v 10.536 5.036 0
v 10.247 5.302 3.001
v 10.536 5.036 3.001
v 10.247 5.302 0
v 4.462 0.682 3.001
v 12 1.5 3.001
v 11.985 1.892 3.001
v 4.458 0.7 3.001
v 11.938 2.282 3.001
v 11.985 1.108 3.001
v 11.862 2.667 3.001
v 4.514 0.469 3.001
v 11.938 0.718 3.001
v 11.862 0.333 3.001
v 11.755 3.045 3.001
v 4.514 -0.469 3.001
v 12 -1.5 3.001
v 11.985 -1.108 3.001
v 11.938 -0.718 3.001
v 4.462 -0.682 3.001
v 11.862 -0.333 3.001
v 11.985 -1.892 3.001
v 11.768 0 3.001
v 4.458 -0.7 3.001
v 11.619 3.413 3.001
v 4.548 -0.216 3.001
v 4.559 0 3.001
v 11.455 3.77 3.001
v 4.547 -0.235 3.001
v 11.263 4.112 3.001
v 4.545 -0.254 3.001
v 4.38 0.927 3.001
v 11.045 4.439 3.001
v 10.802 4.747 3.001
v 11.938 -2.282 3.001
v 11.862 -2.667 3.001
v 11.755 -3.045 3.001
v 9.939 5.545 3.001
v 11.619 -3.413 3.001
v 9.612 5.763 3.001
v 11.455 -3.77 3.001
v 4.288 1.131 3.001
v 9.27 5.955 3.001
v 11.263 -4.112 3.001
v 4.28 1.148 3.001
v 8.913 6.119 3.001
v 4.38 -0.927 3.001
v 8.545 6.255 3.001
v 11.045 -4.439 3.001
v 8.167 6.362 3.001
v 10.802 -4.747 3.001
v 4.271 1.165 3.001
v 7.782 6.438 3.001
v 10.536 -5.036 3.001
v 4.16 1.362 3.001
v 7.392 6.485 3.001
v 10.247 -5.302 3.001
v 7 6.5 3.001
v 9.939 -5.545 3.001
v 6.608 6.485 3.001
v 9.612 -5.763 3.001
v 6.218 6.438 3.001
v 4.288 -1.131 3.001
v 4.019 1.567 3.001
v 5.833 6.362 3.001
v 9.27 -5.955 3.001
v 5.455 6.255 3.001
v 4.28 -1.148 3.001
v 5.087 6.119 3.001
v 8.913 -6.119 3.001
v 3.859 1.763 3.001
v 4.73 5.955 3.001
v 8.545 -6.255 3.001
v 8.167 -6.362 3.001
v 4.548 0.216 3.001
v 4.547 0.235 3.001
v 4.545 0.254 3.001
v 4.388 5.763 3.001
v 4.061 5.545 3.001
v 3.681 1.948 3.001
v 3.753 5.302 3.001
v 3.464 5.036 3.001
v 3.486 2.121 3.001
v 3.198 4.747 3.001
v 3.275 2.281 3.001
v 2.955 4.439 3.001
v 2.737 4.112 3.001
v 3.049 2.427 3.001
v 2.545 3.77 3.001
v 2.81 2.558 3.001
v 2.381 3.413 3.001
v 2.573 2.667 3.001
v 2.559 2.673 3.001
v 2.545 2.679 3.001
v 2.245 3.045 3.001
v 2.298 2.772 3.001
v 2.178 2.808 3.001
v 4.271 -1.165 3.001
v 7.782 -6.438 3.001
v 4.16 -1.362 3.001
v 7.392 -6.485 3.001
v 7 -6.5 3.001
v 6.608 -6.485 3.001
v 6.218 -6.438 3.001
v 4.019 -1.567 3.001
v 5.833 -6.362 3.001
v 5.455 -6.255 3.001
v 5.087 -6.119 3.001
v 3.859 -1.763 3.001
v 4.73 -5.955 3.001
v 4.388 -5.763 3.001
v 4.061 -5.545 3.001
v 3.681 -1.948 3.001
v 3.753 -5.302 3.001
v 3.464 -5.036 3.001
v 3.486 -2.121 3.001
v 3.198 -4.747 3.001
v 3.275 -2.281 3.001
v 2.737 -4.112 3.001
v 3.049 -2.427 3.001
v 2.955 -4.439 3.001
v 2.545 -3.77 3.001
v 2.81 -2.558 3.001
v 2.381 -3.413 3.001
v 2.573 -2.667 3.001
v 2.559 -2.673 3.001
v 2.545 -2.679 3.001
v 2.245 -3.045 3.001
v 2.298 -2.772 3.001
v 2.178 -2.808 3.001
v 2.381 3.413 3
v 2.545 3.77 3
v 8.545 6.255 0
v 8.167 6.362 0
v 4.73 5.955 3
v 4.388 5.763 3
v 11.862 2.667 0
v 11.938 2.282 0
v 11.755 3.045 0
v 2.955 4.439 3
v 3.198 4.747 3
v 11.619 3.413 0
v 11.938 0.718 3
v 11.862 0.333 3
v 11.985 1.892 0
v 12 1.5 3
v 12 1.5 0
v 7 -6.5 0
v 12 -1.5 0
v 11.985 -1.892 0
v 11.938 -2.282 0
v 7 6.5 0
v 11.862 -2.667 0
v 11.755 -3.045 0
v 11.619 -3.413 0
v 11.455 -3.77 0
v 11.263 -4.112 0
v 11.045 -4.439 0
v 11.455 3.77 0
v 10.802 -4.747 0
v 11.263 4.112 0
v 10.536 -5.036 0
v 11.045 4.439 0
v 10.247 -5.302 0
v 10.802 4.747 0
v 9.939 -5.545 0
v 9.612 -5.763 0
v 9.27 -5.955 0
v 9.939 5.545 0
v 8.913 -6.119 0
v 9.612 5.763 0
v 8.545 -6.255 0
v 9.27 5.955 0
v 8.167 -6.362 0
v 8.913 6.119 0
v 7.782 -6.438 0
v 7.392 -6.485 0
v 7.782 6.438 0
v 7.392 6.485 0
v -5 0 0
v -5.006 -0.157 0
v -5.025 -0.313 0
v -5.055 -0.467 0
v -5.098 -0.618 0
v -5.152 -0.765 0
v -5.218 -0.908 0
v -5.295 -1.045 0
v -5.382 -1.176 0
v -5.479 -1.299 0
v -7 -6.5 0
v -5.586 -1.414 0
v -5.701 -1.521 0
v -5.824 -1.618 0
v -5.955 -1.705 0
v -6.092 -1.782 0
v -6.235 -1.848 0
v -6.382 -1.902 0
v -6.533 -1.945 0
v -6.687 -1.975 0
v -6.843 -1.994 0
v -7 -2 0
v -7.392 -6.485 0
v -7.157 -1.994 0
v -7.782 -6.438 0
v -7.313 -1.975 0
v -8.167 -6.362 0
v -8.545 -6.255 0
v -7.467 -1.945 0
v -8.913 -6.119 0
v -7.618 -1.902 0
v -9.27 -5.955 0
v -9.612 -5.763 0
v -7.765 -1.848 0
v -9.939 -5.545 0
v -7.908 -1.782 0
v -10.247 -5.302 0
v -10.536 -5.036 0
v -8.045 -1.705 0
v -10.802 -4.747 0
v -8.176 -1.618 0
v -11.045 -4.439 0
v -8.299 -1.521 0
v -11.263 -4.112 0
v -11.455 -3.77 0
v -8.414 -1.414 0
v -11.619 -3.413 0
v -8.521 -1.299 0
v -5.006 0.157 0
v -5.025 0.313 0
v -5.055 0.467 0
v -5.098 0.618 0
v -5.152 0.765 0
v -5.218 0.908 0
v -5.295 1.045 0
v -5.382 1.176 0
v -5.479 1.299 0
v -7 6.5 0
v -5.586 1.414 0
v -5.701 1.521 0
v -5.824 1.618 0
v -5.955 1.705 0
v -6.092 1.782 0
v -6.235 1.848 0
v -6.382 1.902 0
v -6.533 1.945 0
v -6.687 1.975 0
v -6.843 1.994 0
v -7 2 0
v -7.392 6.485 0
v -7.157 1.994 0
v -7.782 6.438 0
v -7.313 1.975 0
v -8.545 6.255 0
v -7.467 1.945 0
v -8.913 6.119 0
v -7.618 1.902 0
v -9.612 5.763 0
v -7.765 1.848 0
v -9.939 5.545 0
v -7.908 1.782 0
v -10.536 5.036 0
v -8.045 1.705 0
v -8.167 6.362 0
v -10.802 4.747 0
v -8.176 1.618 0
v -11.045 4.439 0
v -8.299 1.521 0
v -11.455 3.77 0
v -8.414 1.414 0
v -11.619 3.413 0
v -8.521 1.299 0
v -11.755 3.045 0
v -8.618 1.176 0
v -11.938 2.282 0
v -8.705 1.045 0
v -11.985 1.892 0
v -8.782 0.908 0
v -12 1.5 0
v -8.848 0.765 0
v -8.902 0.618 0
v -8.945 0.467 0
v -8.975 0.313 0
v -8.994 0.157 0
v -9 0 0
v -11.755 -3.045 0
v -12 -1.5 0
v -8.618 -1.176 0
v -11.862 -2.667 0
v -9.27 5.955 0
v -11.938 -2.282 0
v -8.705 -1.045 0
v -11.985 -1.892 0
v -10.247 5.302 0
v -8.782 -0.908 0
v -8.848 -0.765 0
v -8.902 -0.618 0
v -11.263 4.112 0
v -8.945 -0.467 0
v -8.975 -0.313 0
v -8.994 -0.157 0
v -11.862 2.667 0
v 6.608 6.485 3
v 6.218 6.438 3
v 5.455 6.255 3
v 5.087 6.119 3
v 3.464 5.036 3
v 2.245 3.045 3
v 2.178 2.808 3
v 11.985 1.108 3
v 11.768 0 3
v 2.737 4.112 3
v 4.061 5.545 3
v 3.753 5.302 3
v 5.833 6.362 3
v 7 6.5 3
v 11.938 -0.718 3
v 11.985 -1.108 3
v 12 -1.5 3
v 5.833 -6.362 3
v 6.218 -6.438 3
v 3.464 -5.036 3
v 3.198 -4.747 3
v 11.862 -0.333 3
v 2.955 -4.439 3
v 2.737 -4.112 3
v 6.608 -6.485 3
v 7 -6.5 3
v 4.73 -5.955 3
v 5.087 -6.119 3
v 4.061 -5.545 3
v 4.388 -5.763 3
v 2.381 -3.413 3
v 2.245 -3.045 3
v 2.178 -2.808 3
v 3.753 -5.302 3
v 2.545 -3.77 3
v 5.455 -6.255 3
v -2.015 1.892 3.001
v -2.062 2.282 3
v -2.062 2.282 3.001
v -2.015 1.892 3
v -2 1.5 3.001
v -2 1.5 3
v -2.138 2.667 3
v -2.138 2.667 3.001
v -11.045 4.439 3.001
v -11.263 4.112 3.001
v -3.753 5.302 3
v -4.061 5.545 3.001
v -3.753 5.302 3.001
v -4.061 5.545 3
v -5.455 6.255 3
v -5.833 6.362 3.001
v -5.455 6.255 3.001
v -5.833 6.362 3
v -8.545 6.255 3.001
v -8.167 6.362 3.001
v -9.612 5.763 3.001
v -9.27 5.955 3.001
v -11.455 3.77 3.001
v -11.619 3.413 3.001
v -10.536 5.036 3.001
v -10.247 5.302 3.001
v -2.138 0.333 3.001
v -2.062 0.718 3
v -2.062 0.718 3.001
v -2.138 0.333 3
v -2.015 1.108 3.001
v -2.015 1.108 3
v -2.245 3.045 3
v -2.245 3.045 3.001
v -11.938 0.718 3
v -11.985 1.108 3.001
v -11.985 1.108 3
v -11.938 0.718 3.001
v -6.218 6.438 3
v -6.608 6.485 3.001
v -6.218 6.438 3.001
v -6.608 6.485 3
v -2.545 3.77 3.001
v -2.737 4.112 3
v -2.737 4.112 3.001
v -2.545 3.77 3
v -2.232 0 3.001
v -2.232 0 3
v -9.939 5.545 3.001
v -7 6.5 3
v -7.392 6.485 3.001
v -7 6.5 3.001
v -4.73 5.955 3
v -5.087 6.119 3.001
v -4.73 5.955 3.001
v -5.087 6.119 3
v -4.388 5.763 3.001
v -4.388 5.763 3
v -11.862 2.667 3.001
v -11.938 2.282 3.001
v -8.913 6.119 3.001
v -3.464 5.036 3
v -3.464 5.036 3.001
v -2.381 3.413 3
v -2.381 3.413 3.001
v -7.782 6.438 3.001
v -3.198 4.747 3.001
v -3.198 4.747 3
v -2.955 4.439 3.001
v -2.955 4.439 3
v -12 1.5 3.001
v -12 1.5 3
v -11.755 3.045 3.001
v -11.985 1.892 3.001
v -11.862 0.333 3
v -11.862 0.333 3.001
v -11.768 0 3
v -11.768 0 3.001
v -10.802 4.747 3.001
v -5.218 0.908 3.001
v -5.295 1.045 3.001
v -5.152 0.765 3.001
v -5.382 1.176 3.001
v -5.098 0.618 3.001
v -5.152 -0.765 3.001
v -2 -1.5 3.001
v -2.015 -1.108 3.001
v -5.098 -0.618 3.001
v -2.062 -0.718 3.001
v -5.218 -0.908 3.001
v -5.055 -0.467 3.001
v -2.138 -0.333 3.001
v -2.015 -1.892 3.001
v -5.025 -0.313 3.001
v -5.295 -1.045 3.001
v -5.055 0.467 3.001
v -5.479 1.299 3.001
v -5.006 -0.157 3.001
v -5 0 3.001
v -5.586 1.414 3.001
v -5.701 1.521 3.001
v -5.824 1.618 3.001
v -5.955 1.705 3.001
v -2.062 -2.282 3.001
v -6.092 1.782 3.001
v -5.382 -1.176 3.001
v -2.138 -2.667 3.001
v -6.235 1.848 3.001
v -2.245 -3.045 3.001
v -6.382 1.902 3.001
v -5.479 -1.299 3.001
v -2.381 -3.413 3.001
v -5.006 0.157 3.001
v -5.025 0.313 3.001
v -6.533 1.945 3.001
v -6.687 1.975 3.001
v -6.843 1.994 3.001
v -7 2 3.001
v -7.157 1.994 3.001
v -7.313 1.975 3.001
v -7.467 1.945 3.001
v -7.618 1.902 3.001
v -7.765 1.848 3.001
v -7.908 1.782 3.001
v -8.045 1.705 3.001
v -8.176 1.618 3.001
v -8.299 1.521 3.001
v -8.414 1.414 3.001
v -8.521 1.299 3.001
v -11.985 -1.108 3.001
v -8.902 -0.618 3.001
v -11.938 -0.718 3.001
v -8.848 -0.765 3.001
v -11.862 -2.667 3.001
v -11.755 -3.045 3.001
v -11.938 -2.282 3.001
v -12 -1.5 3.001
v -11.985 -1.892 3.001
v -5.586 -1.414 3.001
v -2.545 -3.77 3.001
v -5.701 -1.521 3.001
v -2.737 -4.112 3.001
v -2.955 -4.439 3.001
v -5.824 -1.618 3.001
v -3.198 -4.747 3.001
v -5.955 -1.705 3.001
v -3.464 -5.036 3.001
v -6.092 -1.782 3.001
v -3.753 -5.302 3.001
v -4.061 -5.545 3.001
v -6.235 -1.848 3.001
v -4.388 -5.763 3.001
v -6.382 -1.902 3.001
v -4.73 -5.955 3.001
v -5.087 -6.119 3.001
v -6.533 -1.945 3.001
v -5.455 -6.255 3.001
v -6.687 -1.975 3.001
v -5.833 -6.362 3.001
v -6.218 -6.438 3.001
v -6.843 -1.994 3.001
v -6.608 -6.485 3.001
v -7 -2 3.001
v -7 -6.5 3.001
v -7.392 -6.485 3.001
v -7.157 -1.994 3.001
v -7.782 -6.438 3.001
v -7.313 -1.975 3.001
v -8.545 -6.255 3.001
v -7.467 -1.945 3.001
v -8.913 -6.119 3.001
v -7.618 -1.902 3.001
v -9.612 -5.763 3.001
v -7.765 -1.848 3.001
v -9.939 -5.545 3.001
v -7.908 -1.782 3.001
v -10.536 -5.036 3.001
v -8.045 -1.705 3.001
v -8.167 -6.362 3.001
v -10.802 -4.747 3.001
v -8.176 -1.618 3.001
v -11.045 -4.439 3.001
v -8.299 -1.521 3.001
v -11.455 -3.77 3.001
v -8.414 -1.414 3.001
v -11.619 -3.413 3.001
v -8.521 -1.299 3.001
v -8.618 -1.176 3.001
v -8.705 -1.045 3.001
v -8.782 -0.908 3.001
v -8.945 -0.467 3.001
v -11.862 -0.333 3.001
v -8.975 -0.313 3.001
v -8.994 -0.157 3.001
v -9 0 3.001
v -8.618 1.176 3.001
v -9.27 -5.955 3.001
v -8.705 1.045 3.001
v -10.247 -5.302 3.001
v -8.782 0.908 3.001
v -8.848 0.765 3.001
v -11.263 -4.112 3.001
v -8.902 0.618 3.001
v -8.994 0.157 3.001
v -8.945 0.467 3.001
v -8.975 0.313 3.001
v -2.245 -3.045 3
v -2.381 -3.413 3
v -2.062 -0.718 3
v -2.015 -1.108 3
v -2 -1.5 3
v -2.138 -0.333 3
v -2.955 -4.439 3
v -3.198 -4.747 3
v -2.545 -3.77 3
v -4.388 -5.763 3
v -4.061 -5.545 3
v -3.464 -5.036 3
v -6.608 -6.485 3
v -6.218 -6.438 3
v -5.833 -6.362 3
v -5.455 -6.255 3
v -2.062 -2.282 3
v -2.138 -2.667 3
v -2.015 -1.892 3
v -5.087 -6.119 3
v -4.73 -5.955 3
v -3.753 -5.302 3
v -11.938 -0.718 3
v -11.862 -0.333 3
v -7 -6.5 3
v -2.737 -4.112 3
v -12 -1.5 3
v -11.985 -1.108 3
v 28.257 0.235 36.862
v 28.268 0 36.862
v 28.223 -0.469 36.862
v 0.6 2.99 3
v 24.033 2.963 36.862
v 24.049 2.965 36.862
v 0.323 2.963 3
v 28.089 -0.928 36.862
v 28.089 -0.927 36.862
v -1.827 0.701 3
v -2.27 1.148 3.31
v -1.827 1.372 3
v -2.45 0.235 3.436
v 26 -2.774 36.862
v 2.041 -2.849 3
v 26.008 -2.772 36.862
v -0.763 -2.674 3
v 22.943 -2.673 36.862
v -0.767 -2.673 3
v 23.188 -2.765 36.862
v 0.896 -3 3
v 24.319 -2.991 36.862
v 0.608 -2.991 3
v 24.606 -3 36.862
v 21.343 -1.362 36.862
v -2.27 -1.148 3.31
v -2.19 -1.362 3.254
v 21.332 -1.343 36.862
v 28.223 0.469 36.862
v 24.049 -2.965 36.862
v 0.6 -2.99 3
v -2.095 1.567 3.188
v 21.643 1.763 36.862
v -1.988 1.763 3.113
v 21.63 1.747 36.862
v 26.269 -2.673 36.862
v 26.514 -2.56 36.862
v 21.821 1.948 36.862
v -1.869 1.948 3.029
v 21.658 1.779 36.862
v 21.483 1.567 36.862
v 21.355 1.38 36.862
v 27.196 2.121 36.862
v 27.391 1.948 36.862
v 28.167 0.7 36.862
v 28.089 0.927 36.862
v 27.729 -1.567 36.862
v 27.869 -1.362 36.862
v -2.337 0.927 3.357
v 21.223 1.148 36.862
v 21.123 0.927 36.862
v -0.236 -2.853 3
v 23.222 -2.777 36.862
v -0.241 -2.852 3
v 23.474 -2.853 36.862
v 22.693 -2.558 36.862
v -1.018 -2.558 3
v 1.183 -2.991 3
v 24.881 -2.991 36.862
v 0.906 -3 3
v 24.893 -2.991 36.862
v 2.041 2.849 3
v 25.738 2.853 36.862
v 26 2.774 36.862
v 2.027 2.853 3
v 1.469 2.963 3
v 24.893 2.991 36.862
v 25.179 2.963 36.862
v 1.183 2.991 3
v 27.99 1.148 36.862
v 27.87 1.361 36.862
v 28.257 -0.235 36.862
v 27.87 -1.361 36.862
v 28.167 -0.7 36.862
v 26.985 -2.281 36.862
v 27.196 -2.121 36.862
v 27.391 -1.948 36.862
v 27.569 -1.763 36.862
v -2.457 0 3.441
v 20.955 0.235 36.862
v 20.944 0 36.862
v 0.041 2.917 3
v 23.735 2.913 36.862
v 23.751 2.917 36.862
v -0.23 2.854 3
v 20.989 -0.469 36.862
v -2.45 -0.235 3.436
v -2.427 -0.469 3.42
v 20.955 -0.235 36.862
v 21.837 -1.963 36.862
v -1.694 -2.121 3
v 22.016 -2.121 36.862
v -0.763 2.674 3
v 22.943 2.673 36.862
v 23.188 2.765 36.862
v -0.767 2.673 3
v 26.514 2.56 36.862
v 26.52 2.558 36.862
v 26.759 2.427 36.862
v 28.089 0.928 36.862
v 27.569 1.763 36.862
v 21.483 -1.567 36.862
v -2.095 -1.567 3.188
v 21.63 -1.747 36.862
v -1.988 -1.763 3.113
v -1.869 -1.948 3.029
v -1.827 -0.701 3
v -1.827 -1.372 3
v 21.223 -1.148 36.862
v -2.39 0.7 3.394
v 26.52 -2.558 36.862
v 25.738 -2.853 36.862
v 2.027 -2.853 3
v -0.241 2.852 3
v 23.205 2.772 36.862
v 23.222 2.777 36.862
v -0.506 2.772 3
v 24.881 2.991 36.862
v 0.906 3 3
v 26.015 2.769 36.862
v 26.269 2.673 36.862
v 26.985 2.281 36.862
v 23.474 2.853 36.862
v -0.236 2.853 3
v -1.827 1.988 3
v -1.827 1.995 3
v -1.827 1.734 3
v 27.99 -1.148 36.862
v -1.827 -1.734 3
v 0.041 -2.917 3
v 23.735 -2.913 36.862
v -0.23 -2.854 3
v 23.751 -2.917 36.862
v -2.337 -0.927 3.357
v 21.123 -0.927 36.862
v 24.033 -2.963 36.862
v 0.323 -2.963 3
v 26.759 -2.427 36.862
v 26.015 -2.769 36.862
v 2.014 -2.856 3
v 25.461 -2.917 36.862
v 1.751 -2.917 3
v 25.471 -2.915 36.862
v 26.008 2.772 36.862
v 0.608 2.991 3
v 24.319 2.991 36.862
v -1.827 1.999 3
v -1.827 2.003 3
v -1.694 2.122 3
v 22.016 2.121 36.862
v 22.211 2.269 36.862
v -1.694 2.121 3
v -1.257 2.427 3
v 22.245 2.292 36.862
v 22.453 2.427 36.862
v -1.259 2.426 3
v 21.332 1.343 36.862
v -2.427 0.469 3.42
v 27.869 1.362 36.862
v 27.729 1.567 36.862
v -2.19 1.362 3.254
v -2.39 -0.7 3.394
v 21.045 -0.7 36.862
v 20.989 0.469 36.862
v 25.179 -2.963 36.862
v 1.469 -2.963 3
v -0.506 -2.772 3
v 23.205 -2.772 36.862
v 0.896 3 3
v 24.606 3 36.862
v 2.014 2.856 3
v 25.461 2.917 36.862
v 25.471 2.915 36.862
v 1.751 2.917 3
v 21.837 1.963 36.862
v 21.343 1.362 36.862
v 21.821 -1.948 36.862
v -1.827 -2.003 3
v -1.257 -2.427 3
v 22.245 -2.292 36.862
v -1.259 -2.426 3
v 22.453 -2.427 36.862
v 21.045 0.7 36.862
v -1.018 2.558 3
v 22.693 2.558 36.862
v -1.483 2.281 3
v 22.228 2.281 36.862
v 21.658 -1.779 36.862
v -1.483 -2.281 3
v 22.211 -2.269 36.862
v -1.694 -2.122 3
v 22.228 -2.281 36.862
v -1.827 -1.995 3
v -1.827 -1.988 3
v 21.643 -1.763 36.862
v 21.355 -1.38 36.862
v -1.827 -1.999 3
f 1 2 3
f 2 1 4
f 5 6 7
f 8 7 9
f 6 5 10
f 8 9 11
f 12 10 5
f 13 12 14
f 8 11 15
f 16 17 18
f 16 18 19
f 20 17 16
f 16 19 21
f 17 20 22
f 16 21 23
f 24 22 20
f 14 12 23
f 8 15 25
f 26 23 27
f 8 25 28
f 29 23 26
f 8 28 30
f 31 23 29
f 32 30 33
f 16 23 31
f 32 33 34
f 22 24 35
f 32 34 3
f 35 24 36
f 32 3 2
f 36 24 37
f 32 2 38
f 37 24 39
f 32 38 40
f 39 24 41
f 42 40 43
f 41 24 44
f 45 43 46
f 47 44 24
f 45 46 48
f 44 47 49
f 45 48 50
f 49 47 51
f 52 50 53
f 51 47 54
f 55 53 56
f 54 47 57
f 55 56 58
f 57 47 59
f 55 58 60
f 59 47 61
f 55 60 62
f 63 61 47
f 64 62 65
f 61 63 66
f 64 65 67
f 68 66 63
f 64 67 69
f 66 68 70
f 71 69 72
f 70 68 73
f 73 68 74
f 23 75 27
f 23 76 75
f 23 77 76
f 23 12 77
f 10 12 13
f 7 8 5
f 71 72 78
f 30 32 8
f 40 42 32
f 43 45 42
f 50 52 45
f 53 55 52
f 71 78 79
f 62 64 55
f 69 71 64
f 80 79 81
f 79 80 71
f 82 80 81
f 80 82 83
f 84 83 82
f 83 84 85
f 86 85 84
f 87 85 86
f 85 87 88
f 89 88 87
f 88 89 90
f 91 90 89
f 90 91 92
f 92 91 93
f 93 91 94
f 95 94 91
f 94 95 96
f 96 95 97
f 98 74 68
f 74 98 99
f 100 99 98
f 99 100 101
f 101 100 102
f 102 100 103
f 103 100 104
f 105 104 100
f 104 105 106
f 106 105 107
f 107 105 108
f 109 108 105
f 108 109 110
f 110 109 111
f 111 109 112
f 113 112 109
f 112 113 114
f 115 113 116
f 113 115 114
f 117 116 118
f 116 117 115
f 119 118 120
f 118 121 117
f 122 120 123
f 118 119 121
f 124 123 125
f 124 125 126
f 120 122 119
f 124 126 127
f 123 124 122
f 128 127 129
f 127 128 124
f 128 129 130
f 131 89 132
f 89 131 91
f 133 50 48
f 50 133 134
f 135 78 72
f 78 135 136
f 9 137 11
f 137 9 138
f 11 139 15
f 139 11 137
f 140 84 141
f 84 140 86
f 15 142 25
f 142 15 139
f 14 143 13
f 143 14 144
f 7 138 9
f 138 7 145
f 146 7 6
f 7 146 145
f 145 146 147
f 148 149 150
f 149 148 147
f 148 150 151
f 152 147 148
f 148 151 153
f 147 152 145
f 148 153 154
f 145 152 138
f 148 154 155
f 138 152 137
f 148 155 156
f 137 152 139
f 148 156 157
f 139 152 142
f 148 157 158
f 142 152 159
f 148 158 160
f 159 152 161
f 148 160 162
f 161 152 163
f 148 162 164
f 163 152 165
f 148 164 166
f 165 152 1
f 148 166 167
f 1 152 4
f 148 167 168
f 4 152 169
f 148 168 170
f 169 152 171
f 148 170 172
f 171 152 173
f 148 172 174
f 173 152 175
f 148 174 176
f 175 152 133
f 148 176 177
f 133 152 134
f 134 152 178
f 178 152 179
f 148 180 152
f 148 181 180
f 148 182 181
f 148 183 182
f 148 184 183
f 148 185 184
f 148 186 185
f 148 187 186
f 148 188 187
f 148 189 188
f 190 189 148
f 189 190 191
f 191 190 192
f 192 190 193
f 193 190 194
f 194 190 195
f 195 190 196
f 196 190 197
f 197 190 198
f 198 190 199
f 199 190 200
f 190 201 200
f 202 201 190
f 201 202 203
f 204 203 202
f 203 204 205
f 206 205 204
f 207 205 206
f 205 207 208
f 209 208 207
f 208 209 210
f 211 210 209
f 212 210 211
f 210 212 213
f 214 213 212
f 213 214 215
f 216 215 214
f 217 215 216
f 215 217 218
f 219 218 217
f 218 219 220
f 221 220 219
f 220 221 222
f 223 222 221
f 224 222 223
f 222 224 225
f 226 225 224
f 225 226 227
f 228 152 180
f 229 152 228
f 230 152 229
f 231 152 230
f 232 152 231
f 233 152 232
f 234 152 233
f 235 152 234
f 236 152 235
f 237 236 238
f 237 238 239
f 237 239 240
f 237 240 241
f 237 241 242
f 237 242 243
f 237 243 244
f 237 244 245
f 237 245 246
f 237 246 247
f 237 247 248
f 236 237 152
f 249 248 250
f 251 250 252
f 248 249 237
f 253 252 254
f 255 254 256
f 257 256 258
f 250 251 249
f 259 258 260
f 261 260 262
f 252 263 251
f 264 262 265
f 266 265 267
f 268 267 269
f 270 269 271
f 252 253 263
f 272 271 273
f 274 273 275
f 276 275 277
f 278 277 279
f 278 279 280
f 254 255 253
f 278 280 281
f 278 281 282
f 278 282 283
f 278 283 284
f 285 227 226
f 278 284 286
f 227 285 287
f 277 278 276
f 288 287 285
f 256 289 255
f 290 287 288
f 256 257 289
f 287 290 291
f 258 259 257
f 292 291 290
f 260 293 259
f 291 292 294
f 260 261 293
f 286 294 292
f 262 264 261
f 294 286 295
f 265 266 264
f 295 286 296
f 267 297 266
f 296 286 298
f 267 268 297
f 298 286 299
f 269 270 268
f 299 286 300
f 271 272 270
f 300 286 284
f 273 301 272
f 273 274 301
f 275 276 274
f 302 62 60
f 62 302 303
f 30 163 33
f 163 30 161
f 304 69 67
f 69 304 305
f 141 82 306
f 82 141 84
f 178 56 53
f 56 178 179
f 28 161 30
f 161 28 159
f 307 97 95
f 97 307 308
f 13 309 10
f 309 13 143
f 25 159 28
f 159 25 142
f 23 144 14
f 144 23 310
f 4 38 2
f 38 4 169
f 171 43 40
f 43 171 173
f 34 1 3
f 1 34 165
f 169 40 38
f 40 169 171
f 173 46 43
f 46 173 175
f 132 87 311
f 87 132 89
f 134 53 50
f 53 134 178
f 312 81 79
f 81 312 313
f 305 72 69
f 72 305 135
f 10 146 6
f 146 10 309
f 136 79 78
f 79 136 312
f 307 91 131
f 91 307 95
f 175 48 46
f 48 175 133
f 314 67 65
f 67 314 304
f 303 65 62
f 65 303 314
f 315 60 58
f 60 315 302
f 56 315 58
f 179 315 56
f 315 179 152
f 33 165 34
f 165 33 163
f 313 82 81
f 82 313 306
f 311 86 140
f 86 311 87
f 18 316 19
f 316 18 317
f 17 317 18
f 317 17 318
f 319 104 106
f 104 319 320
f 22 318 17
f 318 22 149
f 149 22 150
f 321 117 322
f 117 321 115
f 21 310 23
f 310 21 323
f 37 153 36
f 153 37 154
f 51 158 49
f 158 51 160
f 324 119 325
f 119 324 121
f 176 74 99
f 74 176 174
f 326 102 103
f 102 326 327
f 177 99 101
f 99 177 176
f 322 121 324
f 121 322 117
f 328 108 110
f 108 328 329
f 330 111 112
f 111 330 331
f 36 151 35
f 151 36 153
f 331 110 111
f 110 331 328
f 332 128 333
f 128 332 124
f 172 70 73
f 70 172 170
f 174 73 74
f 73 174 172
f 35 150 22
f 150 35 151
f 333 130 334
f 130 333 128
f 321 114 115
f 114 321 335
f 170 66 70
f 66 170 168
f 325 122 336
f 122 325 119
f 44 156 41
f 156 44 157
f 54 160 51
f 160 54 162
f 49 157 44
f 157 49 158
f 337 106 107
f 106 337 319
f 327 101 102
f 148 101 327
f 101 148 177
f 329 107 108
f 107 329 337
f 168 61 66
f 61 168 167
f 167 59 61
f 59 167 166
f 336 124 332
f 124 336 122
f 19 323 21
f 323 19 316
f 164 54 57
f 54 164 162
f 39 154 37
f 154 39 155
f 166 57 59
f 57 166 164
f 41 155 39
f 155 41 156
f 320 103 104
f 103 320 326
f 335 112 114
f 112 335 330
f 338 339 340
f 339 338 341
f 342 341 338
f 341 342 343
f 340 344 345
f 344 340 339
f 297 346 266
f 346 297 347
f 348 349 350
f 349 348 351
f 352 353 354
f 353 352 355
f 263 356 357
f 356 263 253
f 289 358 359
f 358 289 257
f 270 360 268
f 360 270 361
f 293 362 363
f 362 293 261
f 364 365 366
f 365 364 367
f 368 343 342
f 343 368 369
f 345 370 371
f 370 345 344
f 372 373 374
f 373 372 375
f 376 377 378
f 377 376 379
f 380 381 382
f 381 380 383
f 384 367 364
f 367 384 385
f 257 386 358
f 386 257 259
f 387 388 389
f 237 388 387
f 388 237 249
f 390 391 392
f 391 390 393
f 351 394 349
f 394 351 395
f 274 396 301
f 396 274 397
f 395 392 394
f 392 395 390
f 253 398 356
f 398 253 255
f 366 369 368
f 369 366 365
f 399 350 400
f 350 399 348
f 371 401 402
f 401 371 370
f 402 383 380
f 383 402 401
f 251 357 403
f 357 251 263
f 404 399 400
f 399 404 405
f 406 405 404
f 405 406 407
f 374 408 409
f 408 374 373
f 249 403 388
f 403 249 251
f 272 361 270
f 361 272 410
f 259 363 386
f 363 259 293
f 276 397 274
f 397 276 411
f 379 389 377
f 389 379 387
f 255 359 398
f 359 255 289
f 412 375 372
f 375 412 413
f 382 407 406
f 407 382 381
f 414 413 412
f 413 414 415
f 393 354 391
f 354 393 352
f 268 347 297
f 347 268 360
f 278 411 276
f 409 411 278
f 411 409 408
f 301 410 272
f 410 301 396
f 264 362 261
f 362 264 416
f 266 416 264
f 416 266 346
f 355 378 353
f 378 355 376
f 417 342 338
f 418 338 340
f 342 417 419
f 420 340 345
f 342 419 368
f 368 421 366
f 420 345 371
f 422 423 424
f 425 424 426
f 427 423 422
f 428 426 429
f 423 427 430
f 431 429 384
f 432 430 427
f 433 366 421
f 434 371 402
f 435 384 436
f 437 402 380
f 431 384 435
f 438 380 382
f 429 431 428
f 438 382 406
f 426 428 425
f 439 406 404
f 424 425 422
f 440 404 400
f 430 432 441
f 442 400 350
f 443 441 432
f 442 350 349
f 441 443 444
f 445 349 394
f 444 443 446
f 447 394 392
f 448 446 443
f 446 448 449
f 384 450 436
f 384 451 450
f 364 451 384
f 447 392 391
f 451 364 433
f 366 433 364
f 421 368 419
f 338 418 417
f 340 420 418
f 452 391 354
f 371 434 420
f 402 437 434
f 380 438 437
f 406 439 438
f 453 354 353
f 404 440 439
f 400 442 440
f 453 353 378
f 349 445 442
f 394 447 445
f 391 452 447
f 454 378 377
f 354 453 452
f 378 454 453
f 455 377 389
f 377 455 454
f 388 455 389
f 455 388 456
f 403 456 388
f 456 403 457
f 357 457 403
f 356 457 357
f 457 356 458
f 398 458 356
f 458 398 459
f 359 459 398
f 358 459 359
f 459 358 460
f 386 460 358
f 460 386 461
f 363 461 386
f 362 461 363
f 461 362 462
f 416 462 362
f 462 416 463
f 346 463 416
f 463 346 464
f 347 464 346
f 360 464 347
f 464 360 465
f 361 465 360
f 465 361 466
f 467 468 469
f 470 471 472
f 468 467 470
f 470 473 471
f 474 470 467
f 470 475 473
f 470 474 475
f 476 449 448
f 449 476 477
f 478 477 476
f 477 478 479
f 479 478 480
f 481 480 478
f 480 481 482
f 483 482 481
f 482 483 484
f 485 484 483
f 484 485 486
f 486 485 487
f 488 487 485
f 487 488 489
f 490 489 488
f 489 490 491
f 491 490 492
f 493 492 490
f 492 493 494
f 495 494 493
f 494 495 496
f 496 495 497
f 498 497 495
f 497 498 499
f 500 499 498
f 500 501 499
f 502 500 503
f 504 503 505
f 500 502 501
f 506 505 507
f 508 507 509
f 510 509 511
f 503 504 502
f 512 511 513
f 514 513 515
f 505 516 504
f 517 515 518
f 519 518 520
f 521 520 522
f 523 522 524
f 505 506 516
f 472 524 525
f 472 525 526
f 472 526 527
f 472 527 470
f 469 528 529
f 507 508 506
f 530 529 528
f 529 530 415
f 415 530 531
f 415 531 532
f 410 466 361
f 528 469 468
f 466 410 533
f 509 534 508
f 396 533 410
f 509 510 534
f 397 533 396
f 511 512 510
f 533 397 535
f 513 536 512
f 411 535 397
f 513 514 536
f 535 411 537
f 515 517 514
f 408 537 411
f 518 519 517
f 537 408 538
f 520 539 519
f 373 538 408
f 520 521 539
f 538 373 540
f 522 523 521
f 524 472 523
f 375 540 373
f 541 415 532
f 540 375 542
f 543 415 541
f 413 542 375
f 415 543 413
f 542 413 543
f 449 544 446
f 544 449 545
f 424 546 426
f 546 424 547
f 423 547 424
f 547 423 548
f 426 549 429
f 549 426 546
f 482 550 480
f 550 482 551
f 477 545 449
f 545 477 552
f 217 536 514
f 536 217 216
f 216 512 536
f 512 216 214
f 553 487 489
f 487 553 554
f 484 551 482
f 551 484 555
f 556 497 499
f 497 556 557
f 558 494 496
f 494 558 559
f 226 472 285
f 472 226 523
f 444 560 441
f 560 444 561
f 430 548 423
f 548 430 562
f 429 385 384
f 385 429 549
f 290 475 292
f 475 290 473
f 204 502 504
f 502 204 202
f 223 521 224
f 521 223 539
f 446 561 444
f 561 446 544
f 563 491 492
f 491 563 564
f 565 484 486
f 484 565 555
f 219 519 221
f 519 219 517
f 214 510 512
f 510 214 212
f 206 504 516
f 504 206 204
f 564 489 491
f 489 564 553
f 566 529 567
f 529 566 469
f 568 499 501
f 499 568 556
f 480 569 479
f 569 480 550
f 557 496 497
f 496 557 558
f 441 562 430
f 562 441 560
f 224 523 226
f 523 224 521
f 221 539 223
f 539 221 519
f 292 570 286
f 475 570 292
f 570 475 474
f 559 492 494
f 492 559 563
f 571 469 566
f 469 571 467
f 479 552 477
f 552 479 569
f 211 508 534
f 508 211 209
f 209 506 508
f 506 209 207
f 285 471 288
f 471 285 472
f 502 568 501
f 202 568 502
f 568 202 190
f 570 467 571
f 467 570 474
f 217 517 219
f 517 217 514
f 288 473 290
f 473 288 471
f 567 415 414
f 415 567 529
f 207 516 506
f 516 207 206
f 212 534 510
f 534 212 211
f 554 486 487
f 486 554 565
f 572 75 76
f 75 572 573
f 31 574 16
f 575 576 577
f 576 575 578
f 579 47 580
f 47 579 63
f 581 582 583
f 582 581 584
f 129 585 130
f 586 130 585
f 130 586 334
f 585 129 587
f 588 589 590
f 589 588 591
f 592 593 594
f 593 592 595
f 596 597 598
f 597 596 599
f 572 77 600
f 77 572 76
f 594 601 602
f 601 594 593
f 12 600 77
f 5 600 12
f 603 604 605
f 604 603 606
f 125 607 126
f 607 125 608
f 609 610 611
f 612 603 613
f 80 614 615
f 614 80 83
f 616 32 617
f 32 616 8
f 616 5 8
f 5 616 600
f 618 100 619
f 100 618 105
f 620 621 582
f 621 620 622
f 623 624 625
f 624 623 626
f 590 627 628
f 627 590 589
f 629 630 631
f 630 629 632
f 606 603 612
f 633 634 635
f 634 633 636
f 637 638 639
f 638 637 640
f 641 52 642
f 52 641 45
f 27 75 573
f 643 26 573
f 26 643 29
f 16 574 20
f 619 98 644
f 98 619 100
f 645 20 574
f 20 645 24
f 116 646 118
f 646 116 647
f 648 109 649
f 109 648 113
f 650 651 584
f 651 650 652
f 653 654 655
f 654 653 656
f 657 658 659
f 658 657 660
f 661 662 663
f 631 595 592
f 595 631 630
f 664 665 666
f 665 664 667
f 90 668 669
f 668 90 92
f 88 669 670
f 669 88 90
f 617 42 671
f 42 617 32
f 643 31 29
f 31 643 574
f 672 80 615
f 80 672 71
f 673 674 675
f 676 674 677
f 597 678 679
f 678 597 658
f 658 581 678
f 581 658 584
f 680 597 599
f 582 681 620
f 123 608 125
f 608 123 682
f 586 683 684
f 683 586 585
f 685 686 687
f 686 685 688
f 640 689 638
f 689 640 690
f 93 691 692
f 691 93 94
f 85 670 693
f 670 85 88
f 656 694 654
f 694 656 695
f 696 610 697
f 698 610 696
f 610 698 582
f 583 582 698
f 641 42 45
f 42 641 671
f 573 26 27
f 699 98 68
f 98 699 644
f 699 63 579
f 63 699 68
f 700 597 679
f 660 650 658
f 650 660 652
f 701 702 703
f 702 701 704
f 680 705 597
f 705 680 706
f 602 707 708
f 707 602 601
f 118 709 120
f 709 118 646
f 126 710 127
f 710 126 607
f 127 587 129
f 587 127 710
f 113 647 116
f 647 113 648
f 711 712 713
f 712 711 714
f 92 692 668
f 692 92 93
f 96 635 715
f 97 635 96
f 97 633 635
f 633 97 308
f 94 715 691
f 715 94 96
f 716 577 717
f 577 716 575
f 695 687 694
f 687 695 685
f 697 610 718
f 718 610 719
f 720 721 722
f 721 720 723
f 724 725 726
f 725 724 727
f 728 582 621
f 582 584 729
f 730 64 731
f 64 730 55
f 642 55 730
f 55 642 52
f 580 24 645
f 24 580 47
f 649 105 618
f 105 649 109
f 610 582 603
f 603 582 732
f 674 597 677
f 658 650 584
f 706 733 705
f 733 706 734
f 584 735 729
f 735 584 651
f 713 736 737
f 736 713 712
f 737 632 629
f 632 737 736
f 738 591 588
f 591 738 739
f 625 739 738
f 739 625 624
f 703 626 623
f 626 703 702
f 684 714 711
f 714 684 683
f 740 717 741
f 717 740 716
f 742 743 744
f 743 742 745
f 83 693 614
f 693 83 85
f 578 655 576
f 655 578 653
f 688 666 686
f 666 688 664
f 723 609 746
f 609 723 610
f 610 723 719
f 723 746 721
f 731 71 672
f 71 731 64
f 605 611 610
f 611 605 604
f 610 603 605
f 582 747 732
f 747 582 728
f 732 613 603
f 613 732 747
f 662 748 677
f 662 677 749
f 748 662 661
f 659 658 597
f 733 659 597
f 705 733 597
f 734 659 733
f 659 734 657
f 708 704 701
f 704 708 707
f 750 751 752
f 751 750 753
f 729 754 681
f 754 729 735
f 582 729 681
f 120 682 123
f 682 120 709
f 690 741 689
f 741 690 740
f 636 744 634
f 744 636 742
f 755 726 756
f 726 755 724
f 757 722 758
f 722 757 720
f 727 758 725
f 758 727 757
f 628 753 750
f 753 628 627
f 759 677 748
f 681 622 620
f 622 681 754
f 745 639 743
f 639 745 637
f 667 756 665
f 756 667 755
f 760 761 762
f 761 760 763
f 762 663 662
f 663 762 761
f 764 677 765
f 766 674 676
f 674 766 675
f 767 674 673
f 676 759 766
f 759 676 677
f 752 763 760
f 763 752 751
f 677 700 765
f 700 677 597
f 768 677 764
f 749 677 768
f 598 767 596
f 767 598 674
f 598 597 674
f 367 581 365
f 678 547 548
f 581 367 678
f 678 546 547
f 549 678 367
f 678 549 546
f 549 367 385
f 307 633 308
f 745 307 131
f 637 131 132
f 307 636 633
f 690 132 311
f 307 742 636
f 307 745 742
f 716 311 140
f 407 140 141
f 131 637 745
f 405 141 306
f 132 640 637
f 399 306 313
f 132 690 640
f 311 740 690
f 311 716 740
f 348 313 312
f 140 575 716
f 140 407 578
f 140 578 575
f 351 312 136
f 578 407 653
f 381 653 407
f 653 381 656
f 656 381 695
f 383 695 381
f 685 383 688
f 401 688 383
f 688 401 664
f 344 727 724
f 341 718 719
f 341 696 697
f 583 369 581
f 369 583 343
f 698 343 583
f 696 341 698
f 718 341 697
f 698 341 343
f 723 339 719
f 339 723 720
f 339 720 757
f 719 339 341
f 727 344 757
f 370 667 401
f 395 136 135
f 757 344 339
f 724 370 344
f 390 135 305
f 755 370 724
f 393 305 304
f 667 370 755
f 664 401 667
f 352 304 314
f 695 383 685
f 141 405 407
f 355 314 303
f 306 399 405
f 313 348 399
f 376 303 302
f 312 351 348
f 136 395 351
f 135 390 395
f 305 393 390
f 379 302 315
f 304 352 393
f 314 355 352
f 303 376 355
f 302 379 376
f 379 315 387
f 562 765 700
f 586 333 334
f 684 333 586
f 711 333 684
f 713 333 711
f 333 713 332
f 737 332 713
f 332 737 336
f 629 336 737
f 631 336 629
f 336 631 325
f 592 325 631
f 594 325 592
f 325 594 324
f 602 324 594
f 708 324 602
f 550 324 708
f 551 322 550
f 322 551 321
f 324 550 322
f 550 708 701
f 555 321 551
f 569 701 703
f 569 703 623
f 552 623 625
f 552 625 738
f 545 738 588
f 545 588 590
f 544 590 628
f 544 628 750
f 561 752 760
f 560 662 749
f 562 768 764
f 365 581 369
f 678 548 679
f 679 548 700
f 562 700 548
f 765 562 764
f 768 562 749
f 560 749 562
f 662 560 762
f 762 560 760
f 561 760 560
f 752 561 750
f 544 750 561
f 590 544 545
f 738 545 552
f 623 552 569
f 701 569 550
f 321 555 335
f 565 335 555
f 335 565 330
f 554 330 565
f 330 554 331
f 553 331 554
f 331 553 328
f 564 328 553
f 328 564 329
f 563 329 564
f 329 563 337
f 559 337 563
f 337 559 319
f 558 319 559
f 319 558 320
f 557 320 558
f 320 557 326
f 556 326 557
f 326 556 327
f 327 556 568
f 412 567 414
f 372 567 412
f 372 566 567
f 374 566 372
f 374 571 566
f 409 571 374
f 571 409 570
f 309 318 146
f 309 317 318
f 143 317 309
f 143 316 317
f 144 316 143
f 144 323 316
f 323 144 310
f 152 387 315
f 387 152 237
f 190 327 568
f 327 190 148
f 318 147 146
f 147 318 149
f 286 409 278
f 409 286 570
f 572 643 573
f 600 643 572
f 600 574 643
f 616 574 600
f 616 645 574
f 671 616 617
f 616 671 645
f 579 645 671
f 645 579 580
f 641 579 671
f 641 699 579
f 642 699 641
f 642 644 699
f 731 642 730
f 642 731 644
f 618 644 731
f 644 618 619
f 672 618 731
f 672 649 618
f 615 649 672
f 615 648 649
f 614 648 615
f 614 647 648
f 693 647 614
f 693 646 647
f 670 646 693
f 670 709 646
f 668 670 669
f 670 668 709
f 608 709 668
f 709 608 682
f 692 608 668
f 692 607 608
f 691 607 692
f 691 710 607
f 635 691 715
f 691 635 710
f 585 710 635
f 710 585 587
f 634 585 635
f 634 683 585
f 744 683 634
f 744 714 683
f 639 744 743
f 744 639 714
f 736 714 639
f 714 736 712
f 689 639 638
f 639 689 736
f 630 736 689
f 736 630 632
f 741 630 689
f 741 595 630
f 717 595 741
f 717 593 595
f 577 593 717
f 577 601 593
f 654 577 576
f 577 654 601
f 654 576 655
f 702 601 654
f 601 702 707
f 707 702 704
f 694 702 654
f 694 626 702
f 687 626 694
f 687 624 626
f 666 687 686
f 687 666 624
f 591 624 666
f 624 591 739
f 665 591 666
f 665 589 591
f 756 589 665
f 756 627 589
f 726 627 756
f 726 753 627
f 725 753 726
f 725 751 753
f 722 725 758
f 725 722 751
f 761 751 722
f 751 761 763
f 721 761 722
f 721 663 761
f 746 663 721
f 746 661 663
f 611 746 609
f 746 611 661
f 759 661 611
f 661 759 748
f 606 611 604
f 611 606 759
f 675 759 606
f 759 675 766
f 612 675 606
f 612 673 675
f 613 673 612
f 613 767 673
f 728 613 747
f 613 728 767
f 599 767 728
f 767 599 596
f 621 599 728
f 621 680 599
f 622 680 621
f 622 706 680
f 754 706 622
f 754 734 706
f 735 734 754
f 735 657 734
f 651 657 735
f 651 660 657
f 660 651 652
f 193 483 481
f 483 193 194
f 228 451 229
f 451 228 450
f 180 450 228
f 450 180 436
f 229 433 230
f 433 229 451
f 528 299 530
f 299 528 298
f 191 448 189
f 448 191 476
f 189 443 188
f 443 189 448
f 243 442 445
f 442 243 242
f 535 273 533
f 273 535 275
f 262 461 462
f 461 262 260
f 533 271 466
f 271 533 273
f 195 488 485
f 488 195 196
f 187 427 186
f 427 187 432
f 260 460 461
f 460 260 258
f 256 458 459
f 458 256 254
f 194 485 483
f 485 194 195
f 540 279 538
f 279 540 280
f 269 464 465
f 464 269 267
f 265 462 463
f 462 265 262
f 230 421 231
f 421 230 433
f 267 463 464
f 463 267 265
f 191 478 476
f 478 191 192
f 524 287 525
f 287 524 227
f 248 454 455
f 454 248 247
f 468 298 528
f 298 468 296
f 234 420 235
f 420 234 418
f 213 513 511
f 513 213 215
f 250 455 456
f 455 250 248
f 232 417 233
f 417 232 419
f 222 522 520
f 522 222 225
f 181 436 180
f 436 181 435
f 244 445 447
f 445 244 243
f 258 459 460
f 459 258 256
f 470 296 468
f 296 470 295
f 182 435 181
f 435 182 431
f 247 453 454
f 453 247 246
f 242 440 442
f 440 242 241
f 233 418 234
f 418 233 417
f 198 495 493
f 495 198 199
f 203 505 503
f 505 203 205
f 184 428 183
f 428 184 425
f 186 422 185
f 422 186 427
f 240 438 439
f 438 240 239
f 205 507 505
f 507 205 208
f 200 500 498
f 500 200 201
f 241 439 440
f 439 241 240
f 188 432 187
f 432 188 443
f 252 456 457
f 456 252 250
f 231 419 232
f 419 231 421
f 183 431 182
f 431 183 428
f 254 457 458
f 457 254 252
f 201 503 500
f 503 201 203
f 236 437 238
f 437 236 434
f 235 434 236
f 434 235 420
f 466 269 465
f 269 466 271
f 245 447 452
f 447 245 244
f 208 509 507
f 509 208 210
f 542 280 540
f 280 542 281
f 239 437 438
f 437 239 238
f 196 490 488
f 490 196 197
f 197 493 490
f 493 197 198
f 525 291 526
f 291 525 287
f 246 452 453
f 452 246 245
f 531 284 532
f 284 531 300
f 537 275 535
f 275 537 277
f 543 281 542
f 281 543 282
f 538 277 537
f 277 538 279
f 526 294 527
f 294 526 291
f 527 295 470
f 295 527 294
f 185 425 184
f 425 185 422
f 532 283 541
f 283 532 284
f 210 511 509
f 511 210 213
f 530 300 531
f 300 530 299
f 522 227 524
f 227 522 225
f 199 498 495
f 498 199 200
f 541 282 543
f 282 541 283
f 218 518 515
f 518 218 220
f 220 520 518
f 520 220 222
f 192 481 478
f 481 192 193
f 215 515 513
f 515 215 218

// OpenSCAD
$fn=80;
baseX=24; baseY=13; baseZ=3;
cylinder_radius=3; 
cylinder_height=45;
z_offset = cylinder_radius*sin(35);
holeRadius = 2;
holeOffset = 5;
filletRadius = 5;
trimX = baseX - filletRadius*2;
trimY = baseY - filletRadius*2;
tinyOffset=0.01;

difference() {
    union() {
        translate([0,0,z_offset])
            rotate([0,35,0])
            cylinder(r=cylinder_radius, h=cylinder_height);
        translate([-trimX/2, -baseY/2, 0]) cube([trimX, baseY, baseZ]);
        translate([-baseX/2, -trimY/2, 0]) cube([baseX, trimY, baseZ]);
        for (x=[baseX/2-filletRadius, -baseX/2+filletRadius],
                y=[baseY/2-filletRadius, -baseY/2+filletRadius]) {
            translate([x, y, 0]) cylinder(r=filletRadius, h=baseZ+0.001);
        };
    };
    translate([-baseX/2,-baseY/2,cylinder_height*sin(55)])
        cube([baseX*2, baseY, baseZ*2]);
    translate([-baseX/2+holeOffset, 0, -tinyOffset])
        cylinder(r=holeRadius, h=baseZ+tinyOffset*2);
}
